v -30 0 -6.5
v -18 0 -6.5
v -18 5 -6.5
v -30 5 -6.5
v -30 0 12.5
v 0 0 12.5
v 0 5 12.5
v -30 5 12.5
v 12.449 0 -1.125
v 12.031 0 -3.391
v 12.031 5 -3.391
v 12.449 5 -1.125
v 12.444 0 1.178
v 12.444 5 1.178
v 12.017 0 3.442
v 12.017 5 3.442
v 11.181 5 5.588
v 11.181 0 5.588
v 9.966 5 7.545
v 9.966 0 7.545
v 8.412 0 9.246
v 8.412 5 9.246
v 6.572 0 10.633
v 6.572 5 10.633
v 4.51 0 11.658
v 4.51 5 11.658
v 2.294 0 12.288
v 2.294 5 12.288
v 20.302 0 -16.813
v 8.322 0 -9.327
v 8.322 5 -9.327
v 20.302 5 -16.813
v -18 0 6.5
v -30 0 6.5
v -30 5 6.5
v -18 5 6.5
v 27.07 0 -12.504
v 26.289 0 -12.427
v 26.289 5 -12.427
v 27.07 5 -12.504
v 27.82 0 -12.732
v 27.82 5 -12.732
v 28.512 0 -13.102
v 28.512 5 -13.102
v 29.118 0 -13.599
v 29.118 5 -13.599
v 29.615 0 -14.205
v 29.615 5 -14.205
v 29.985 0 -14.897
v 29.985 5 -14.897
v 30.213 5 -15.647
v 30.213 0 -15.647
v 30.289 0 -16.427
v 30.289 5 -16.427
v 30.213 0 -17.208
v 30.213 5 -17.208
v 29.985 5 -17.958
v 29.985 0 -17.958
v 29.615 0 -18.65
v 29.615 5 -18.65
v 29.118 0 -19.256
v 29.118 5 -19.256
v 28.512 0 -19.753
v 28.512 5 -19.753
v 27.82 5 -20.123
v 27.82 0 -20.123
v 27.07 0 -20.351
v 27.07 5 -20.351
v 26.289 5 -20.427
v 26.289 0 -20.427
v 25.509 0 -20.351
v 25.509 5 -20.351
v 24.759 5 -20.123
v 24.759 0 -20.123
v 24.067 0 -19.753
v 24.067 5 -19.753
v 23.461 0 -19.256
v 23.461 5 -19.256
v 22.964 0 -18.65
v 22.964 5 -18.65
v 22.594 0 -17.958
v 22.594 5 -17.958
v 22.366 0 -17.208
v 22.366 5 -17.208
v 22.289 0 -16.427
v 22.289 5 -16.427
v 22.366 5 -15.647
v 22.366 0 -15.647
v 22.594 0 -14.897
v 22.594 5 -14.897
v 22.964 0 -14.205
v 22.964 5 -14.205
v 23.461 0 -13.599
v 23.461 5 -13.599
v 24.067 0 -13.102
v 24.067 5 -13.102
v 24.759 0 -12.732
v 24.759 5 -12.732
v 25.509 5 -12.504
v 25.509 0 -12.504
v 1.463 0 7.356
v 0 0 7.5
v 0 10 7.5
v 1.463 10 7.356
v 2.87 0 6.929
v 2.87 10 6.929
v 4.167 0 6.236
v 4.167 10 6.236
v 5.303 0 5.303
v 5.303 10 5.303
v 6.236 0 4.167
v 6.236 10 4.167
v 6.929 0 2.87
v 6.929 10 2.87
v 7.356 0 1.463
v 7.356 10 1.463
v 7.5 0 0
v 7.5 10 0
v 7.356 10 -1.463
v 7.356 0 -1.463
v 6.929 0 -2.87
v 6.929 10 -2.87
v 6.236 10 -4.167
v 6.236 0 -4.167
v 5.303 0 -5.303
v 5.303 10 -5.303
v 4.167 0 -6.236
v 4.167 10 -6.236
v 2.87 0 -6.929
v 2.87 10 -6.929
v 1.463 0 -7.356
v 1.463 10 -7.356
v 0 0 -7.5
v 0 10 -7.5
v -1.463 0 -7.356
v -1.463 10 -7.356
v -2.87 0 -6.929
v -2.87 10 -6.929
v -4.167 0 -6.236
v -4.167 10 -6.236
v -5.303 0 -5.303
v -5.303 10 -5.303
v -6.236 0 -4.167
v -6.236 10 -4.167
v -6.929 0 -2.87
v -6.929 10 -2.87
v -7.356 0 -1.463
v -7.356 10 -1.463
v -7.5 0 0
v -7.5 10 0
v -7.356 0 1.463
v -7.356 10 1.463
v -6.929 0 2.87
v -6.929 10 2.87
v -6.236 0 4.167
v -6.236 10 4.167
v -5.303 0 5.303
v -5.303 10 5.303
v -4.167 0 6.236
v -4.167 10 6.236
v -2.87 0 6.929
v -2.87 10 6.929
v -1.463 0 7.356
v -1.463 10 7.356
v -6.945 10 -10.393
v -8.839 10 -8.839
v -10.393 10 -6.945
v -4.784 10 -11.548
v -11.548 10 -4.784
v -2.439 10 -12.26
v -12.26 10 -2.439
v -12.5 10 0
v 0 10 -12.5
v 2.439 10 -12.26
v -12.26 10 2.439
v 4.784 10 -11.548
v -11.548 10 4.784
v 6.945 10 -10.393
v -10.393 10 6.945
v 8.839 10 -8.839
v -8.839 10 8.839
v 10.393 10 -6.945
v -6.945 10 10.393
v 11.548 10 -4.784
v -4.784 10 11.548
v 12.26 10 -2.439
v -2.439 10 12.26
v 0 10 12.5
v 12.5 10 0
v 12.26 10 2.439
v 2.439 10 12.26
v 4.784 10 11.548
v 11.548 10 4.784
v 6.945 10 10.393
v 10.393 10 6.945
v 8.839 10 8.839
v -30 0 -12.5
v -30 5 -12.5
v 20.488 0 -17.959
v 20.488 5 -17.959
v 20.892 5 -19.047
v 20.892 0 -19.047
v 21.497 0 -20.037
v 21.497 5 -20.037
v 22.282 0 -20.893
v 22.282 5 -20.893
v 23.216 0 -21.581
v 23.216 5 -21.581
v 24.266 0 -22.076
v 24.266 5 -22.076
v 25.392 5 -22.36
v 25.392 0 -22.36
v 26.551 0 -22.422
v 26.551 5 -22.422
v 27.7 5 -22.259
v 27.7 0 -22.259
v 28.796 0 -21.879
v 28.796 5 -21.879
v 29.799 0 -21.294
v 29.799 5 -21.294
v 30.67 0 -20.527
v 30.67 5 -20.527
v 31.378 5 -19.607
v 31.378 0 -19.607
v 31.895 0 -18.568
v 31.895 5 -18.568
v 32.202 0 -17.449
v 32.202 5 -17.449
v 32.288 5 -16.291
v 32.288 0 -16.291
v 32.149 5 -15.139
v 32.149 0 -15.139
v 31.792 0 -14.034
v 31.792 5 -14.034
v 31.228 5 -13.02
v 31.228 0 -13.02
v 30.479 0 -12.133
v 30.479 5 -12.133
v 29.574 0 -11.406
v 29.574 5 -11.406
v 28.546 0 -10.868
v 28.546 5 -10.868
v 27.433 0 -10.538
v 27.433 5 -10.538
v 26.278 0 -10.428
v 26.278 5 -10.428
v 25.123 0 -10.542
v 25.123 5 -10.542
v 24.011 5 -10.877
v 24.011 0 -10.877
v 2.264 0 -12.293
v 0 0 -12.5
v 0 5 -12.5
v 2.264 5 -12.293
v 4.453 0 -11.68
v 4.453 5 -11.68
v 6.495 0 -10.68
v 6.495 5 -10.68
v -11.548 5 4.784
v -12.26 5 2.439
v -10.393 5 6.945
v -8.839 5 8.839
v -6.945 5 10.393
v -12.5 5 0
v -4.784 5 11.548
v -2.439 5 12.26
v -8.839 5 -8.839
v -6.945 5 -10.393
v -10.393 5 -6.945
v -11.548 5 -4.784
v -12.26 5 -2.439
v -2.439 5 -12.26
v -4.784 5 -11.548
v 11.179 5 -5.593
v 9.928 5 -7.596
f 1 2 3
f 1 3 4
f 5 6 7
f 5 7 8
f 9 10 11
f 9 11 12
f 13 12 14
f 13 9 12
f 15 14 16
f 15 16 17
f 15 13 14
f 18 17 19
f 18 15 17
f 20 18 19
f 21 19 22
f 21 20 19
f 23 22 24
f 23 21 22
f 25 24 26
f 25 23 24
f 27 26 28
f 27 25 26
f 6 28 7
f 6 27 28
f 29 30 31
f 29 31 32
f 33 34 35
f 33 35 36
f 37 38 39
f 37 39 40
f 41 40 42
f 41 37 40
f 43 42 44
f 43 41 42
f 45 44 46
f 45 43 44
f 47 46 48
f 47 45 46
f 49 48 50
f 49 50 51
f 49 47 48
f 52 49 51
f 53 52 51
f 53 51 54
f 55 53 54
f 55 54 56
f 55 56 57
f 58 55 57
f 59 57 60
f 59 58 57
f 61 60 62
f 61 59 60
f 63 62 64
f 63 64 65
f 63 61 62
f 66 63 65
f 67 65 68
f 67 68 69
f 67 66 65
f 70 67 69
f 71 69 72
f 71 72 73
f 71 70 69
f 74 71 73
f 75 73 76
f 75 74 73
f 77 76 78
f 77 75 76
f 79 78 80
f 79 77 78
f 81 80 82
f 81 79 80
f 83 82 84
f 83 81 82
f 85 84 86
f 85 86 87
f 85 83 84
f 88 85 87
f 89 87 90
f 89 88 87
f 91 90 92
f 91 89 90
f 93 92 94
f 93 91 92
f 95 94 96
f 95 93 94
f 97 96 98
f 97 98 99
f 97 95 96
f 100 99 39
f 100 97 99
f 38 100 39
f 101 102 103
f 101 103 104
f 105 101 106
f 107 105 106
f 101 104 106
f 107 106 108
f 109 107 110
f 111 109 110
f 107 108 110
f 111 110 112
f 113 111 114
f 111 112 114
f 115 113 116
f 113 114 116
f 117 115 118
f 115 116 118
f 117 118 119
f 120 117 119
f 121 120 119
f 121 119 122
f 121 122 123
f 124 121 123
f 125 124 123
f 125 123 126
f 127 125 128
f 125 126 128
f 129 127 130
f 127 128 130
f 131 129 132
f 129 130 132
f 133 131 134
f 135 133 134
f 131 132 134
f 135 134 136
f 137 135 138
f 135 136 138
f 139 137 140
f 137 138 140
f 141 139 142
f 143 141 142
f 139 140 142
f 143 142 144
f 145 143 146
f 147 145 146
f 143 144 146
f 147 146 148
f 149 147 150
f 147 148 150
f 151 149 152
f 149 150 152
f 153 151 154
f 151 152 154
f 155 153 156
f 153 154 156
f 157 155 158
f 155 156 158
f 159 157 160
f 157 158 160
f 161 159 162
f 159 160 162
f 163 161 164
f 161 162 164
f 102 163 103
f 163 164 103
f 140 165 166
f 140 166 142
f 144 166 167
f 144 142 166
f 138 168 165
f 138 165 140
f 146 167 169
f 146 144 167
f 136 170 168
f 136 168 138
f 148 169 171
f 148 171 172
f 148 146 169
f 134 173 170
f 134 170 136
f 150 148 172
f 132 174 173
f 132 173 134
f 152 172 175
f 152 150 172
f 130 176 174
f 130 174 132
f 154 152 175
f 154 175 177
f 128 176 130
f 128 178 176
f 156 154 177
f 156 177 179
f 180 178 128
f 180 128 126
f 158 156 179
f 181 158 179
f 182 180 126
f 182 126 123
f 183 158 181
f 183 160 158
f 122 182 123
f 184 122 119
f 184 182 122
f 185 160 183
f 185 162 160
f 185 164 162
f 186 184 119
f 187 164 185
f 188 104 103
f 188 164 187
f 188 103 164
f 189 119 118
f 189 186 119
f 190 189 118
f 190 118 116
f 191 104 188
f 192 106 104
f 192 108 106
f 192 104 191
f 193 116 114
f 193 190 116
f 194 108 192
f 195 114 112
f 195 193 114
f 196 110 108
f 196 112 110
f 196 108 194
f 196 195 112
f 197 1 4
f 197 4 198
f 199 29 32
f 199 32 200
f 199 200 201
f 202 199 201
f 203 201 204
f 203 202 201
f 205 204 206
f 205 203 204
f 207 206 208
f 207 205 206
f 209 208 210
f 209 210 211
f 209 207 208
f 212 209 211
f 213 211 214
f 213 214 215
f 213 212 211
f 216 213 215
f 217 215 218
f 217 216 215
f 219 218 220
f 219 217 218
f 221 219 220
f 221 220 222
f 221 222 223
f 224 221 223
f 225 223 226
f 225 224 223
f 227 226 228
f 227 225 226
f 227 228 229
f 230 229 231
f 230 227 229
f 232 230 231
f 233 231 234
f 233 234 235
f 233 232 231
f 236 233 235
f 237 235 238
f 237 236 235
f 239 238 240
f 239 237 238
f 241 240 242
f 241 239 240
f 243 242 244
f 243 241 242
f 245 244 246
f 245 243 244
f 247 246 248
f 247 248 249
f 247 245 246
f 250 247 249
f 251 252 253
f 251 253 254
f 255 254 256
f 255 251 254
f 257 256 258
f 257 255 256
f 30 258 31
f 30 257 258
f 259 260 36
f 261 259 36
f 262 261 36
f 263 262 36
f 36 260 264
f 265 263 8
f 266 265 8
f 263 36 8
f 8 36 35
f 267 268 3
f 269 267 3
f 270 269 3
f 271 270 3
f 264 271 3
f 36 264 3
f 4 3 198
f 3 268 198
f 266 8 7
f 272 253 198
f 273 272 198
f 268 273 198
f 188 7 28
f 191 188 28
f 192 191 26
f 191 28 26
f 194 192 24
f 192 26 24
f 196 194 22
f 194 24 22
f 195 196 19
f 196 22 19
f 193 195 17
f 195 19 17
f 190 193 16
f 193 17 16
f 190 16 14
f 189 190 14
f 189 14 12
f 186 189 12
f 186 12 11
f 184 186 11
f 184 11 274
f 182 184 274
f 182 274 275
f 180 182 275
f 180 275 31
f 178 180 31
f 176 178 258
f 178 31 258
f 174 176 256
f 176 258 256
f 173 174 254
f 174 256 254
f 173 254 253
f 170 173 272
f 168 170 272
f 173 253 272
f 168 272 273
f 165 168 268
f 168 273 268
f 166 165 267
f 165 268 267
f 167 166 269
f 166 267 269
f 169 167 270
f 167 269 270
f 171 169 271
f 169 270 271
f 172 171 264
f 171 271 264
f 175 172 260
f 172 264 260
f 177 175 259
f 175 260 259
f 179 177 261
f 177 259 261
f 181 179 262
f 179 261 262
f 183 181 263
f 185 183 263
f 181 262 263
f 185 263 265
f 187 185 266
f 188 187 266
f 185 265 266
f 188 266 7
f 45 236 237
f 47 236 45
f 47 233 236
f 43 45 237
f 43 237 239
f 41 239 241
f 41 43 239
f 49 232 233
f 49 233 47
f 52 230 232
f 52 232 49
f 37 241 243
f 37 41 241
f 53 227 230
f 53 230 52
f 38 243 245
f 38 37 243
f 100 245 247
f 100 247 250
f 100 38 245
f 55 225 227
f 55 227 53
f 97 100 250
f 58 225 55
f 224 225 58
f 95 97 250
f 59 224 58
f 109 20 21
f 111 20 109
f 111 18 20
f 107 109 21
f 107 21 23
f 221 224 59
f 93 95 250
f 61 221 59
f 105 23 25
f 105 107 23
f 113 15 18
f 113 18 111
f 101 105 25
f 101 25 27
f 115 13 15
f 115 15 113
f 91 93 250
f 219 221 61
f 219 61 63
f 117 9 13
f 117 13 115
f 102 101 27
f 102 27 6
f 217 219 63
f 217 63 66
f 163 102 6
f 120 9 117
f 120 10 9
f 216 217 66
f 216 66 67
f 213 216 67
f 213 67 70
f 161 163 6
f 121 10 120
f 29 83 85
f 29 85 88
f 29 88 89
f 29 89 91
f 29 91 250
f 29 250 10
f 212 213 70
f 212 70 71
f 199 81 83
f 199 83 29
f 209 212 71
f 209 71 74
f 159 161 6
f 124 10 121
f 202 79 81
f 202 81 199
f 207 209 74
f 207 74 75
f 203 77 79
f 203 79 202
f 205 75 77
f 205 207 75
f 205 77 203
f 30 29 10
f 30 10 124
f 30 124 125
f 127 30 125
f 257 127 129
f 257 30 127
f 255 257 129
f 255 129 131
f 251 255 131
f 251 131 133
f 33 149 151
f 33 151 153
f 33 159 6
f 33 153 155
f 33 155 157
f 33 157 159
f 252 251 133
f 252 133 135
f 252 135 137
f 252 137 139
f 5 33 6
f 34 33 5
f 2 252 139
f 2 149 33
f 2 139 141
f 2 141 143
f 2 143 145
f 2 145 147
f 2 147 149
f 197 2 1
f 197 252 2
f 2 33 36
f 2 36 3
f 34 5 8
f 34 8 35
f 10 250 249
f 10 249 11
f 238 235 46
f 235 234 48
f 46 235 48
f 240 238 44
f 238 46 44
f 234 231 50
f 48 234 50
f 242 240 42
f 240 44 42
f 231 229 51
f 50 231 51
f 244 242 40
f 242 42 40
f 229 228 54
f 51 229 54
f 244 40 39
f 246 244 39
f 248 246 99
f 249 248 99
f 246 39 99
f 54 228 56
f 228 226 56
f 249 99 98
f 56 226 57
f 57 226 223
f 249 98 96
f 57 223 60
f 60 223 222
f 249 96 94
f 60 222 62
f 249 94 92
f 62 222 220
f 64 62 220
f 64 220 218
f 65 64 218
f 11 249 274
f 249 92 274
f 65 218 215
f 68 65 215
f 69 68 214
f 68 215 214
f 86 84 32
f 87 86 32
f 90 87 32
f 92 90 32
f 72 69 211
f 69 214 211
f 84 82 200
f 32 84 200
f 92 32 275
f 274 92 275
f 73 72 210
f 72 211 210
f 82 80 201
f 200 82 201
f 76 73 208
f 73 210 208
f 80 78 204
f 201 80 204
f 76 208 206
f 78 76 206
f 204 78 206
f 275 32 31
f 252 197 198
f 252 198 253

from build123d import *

# Parameters (mm, degrees)
EXTRUDE_2_DEPTH     = 5
SKETCH_4_R          = 4
CUT_EXTRUDE_1_DEPTH = 5
SKETCH_6_R          = 12.5
EXTRUDE_3_DEPTH     = 5
SKETCH_8_R          = 7.5
CUT_EXTRUDE_2_DEPTH = 5


with BuildPart() as part:
    # 草图3 → 凸台-拉伸2 (new body)
    with BuildSketch(Plane(origin=(0, 0, 0), x_dir=(1, 0, 0), z_dir=(0, 1, 0))):
        with BuildLine():
            Line((0, -12.5), (-30, -12.5))
            Line((-30, -12.5), (-30, -6.5))
            Line((-30, -6.5), (-18, -6.5))
            Line((-18, -6.5), (-18, 6.5))
            Line((-18, 6.5), (-30, 6.5))
            Line((-30, 6.5), (-30, 12.5))
            Line((-30, 12.5), (0, 12.5))
            ThreePointArc((0, 12.5), (4.453089161, 11.679897128), (8.321859729, 9.327199507))
            Line((8.321859729, 9.327199507), (20.301898362, 16.813158484))
            ThreePointArc((20.301898362, 16.813158484), (31.377779558, 19.607012777), (24.011333212, 10.876821811))
            Line((24.011333212, 10.876821811), (12.031294579, 3.390862834))
            ThreePointArc((12.031294579, 3.390862834), (9.965836278, -7.545336791), (0, -12.5))
        make_face()
    extrude(amount=EXTRUDE_2_DEPTH)

    # 草图4 → 切除-拉伸1 (cut)
    with BuildSketch(Plane(origin=(0, 0, 0), x_dir=(1, 0, 0), z_dir=(0, 1, 0))):
        with Locations(Location((26.289490981, 16.427497191, 0), (0, 0, 270))):
            Circle(SKETCH_4_R)
    extrude(amount=CUT_EXTRUDE_1_DEPTH, mode=Mode.SUBTRACT)

    # 草图6 → 凸台-拉伸3 (add)
    with BuildSketch(Plane(origin=(0, 5, 0), x_dir=(1, 0, 0), z_dir=(0, 1, 0))):
        with Locations(Location((0, 0, 0), (0, 0, 270))):
            Circle(SKETCH_6_R)
    extrude(amount=EXTRUDE_3_DEPTH)

    # 草图8 → 切除-拉伸2 (cut, symmetric)
    with BuildSketch(Plane(origin=(0, 5, 0), x_dir=(1, 0, 0), z_dir=(0, 1, 0))):
        with Locations(Location((0, 0, 0), (0, 0, 270))):
            Circle(SKETCH_8_R)
    extrude(amount=CUT_EXTRUDE_2_DEPTH, both=True, mode=Mode.SUBTRACT)


solid = part.part
